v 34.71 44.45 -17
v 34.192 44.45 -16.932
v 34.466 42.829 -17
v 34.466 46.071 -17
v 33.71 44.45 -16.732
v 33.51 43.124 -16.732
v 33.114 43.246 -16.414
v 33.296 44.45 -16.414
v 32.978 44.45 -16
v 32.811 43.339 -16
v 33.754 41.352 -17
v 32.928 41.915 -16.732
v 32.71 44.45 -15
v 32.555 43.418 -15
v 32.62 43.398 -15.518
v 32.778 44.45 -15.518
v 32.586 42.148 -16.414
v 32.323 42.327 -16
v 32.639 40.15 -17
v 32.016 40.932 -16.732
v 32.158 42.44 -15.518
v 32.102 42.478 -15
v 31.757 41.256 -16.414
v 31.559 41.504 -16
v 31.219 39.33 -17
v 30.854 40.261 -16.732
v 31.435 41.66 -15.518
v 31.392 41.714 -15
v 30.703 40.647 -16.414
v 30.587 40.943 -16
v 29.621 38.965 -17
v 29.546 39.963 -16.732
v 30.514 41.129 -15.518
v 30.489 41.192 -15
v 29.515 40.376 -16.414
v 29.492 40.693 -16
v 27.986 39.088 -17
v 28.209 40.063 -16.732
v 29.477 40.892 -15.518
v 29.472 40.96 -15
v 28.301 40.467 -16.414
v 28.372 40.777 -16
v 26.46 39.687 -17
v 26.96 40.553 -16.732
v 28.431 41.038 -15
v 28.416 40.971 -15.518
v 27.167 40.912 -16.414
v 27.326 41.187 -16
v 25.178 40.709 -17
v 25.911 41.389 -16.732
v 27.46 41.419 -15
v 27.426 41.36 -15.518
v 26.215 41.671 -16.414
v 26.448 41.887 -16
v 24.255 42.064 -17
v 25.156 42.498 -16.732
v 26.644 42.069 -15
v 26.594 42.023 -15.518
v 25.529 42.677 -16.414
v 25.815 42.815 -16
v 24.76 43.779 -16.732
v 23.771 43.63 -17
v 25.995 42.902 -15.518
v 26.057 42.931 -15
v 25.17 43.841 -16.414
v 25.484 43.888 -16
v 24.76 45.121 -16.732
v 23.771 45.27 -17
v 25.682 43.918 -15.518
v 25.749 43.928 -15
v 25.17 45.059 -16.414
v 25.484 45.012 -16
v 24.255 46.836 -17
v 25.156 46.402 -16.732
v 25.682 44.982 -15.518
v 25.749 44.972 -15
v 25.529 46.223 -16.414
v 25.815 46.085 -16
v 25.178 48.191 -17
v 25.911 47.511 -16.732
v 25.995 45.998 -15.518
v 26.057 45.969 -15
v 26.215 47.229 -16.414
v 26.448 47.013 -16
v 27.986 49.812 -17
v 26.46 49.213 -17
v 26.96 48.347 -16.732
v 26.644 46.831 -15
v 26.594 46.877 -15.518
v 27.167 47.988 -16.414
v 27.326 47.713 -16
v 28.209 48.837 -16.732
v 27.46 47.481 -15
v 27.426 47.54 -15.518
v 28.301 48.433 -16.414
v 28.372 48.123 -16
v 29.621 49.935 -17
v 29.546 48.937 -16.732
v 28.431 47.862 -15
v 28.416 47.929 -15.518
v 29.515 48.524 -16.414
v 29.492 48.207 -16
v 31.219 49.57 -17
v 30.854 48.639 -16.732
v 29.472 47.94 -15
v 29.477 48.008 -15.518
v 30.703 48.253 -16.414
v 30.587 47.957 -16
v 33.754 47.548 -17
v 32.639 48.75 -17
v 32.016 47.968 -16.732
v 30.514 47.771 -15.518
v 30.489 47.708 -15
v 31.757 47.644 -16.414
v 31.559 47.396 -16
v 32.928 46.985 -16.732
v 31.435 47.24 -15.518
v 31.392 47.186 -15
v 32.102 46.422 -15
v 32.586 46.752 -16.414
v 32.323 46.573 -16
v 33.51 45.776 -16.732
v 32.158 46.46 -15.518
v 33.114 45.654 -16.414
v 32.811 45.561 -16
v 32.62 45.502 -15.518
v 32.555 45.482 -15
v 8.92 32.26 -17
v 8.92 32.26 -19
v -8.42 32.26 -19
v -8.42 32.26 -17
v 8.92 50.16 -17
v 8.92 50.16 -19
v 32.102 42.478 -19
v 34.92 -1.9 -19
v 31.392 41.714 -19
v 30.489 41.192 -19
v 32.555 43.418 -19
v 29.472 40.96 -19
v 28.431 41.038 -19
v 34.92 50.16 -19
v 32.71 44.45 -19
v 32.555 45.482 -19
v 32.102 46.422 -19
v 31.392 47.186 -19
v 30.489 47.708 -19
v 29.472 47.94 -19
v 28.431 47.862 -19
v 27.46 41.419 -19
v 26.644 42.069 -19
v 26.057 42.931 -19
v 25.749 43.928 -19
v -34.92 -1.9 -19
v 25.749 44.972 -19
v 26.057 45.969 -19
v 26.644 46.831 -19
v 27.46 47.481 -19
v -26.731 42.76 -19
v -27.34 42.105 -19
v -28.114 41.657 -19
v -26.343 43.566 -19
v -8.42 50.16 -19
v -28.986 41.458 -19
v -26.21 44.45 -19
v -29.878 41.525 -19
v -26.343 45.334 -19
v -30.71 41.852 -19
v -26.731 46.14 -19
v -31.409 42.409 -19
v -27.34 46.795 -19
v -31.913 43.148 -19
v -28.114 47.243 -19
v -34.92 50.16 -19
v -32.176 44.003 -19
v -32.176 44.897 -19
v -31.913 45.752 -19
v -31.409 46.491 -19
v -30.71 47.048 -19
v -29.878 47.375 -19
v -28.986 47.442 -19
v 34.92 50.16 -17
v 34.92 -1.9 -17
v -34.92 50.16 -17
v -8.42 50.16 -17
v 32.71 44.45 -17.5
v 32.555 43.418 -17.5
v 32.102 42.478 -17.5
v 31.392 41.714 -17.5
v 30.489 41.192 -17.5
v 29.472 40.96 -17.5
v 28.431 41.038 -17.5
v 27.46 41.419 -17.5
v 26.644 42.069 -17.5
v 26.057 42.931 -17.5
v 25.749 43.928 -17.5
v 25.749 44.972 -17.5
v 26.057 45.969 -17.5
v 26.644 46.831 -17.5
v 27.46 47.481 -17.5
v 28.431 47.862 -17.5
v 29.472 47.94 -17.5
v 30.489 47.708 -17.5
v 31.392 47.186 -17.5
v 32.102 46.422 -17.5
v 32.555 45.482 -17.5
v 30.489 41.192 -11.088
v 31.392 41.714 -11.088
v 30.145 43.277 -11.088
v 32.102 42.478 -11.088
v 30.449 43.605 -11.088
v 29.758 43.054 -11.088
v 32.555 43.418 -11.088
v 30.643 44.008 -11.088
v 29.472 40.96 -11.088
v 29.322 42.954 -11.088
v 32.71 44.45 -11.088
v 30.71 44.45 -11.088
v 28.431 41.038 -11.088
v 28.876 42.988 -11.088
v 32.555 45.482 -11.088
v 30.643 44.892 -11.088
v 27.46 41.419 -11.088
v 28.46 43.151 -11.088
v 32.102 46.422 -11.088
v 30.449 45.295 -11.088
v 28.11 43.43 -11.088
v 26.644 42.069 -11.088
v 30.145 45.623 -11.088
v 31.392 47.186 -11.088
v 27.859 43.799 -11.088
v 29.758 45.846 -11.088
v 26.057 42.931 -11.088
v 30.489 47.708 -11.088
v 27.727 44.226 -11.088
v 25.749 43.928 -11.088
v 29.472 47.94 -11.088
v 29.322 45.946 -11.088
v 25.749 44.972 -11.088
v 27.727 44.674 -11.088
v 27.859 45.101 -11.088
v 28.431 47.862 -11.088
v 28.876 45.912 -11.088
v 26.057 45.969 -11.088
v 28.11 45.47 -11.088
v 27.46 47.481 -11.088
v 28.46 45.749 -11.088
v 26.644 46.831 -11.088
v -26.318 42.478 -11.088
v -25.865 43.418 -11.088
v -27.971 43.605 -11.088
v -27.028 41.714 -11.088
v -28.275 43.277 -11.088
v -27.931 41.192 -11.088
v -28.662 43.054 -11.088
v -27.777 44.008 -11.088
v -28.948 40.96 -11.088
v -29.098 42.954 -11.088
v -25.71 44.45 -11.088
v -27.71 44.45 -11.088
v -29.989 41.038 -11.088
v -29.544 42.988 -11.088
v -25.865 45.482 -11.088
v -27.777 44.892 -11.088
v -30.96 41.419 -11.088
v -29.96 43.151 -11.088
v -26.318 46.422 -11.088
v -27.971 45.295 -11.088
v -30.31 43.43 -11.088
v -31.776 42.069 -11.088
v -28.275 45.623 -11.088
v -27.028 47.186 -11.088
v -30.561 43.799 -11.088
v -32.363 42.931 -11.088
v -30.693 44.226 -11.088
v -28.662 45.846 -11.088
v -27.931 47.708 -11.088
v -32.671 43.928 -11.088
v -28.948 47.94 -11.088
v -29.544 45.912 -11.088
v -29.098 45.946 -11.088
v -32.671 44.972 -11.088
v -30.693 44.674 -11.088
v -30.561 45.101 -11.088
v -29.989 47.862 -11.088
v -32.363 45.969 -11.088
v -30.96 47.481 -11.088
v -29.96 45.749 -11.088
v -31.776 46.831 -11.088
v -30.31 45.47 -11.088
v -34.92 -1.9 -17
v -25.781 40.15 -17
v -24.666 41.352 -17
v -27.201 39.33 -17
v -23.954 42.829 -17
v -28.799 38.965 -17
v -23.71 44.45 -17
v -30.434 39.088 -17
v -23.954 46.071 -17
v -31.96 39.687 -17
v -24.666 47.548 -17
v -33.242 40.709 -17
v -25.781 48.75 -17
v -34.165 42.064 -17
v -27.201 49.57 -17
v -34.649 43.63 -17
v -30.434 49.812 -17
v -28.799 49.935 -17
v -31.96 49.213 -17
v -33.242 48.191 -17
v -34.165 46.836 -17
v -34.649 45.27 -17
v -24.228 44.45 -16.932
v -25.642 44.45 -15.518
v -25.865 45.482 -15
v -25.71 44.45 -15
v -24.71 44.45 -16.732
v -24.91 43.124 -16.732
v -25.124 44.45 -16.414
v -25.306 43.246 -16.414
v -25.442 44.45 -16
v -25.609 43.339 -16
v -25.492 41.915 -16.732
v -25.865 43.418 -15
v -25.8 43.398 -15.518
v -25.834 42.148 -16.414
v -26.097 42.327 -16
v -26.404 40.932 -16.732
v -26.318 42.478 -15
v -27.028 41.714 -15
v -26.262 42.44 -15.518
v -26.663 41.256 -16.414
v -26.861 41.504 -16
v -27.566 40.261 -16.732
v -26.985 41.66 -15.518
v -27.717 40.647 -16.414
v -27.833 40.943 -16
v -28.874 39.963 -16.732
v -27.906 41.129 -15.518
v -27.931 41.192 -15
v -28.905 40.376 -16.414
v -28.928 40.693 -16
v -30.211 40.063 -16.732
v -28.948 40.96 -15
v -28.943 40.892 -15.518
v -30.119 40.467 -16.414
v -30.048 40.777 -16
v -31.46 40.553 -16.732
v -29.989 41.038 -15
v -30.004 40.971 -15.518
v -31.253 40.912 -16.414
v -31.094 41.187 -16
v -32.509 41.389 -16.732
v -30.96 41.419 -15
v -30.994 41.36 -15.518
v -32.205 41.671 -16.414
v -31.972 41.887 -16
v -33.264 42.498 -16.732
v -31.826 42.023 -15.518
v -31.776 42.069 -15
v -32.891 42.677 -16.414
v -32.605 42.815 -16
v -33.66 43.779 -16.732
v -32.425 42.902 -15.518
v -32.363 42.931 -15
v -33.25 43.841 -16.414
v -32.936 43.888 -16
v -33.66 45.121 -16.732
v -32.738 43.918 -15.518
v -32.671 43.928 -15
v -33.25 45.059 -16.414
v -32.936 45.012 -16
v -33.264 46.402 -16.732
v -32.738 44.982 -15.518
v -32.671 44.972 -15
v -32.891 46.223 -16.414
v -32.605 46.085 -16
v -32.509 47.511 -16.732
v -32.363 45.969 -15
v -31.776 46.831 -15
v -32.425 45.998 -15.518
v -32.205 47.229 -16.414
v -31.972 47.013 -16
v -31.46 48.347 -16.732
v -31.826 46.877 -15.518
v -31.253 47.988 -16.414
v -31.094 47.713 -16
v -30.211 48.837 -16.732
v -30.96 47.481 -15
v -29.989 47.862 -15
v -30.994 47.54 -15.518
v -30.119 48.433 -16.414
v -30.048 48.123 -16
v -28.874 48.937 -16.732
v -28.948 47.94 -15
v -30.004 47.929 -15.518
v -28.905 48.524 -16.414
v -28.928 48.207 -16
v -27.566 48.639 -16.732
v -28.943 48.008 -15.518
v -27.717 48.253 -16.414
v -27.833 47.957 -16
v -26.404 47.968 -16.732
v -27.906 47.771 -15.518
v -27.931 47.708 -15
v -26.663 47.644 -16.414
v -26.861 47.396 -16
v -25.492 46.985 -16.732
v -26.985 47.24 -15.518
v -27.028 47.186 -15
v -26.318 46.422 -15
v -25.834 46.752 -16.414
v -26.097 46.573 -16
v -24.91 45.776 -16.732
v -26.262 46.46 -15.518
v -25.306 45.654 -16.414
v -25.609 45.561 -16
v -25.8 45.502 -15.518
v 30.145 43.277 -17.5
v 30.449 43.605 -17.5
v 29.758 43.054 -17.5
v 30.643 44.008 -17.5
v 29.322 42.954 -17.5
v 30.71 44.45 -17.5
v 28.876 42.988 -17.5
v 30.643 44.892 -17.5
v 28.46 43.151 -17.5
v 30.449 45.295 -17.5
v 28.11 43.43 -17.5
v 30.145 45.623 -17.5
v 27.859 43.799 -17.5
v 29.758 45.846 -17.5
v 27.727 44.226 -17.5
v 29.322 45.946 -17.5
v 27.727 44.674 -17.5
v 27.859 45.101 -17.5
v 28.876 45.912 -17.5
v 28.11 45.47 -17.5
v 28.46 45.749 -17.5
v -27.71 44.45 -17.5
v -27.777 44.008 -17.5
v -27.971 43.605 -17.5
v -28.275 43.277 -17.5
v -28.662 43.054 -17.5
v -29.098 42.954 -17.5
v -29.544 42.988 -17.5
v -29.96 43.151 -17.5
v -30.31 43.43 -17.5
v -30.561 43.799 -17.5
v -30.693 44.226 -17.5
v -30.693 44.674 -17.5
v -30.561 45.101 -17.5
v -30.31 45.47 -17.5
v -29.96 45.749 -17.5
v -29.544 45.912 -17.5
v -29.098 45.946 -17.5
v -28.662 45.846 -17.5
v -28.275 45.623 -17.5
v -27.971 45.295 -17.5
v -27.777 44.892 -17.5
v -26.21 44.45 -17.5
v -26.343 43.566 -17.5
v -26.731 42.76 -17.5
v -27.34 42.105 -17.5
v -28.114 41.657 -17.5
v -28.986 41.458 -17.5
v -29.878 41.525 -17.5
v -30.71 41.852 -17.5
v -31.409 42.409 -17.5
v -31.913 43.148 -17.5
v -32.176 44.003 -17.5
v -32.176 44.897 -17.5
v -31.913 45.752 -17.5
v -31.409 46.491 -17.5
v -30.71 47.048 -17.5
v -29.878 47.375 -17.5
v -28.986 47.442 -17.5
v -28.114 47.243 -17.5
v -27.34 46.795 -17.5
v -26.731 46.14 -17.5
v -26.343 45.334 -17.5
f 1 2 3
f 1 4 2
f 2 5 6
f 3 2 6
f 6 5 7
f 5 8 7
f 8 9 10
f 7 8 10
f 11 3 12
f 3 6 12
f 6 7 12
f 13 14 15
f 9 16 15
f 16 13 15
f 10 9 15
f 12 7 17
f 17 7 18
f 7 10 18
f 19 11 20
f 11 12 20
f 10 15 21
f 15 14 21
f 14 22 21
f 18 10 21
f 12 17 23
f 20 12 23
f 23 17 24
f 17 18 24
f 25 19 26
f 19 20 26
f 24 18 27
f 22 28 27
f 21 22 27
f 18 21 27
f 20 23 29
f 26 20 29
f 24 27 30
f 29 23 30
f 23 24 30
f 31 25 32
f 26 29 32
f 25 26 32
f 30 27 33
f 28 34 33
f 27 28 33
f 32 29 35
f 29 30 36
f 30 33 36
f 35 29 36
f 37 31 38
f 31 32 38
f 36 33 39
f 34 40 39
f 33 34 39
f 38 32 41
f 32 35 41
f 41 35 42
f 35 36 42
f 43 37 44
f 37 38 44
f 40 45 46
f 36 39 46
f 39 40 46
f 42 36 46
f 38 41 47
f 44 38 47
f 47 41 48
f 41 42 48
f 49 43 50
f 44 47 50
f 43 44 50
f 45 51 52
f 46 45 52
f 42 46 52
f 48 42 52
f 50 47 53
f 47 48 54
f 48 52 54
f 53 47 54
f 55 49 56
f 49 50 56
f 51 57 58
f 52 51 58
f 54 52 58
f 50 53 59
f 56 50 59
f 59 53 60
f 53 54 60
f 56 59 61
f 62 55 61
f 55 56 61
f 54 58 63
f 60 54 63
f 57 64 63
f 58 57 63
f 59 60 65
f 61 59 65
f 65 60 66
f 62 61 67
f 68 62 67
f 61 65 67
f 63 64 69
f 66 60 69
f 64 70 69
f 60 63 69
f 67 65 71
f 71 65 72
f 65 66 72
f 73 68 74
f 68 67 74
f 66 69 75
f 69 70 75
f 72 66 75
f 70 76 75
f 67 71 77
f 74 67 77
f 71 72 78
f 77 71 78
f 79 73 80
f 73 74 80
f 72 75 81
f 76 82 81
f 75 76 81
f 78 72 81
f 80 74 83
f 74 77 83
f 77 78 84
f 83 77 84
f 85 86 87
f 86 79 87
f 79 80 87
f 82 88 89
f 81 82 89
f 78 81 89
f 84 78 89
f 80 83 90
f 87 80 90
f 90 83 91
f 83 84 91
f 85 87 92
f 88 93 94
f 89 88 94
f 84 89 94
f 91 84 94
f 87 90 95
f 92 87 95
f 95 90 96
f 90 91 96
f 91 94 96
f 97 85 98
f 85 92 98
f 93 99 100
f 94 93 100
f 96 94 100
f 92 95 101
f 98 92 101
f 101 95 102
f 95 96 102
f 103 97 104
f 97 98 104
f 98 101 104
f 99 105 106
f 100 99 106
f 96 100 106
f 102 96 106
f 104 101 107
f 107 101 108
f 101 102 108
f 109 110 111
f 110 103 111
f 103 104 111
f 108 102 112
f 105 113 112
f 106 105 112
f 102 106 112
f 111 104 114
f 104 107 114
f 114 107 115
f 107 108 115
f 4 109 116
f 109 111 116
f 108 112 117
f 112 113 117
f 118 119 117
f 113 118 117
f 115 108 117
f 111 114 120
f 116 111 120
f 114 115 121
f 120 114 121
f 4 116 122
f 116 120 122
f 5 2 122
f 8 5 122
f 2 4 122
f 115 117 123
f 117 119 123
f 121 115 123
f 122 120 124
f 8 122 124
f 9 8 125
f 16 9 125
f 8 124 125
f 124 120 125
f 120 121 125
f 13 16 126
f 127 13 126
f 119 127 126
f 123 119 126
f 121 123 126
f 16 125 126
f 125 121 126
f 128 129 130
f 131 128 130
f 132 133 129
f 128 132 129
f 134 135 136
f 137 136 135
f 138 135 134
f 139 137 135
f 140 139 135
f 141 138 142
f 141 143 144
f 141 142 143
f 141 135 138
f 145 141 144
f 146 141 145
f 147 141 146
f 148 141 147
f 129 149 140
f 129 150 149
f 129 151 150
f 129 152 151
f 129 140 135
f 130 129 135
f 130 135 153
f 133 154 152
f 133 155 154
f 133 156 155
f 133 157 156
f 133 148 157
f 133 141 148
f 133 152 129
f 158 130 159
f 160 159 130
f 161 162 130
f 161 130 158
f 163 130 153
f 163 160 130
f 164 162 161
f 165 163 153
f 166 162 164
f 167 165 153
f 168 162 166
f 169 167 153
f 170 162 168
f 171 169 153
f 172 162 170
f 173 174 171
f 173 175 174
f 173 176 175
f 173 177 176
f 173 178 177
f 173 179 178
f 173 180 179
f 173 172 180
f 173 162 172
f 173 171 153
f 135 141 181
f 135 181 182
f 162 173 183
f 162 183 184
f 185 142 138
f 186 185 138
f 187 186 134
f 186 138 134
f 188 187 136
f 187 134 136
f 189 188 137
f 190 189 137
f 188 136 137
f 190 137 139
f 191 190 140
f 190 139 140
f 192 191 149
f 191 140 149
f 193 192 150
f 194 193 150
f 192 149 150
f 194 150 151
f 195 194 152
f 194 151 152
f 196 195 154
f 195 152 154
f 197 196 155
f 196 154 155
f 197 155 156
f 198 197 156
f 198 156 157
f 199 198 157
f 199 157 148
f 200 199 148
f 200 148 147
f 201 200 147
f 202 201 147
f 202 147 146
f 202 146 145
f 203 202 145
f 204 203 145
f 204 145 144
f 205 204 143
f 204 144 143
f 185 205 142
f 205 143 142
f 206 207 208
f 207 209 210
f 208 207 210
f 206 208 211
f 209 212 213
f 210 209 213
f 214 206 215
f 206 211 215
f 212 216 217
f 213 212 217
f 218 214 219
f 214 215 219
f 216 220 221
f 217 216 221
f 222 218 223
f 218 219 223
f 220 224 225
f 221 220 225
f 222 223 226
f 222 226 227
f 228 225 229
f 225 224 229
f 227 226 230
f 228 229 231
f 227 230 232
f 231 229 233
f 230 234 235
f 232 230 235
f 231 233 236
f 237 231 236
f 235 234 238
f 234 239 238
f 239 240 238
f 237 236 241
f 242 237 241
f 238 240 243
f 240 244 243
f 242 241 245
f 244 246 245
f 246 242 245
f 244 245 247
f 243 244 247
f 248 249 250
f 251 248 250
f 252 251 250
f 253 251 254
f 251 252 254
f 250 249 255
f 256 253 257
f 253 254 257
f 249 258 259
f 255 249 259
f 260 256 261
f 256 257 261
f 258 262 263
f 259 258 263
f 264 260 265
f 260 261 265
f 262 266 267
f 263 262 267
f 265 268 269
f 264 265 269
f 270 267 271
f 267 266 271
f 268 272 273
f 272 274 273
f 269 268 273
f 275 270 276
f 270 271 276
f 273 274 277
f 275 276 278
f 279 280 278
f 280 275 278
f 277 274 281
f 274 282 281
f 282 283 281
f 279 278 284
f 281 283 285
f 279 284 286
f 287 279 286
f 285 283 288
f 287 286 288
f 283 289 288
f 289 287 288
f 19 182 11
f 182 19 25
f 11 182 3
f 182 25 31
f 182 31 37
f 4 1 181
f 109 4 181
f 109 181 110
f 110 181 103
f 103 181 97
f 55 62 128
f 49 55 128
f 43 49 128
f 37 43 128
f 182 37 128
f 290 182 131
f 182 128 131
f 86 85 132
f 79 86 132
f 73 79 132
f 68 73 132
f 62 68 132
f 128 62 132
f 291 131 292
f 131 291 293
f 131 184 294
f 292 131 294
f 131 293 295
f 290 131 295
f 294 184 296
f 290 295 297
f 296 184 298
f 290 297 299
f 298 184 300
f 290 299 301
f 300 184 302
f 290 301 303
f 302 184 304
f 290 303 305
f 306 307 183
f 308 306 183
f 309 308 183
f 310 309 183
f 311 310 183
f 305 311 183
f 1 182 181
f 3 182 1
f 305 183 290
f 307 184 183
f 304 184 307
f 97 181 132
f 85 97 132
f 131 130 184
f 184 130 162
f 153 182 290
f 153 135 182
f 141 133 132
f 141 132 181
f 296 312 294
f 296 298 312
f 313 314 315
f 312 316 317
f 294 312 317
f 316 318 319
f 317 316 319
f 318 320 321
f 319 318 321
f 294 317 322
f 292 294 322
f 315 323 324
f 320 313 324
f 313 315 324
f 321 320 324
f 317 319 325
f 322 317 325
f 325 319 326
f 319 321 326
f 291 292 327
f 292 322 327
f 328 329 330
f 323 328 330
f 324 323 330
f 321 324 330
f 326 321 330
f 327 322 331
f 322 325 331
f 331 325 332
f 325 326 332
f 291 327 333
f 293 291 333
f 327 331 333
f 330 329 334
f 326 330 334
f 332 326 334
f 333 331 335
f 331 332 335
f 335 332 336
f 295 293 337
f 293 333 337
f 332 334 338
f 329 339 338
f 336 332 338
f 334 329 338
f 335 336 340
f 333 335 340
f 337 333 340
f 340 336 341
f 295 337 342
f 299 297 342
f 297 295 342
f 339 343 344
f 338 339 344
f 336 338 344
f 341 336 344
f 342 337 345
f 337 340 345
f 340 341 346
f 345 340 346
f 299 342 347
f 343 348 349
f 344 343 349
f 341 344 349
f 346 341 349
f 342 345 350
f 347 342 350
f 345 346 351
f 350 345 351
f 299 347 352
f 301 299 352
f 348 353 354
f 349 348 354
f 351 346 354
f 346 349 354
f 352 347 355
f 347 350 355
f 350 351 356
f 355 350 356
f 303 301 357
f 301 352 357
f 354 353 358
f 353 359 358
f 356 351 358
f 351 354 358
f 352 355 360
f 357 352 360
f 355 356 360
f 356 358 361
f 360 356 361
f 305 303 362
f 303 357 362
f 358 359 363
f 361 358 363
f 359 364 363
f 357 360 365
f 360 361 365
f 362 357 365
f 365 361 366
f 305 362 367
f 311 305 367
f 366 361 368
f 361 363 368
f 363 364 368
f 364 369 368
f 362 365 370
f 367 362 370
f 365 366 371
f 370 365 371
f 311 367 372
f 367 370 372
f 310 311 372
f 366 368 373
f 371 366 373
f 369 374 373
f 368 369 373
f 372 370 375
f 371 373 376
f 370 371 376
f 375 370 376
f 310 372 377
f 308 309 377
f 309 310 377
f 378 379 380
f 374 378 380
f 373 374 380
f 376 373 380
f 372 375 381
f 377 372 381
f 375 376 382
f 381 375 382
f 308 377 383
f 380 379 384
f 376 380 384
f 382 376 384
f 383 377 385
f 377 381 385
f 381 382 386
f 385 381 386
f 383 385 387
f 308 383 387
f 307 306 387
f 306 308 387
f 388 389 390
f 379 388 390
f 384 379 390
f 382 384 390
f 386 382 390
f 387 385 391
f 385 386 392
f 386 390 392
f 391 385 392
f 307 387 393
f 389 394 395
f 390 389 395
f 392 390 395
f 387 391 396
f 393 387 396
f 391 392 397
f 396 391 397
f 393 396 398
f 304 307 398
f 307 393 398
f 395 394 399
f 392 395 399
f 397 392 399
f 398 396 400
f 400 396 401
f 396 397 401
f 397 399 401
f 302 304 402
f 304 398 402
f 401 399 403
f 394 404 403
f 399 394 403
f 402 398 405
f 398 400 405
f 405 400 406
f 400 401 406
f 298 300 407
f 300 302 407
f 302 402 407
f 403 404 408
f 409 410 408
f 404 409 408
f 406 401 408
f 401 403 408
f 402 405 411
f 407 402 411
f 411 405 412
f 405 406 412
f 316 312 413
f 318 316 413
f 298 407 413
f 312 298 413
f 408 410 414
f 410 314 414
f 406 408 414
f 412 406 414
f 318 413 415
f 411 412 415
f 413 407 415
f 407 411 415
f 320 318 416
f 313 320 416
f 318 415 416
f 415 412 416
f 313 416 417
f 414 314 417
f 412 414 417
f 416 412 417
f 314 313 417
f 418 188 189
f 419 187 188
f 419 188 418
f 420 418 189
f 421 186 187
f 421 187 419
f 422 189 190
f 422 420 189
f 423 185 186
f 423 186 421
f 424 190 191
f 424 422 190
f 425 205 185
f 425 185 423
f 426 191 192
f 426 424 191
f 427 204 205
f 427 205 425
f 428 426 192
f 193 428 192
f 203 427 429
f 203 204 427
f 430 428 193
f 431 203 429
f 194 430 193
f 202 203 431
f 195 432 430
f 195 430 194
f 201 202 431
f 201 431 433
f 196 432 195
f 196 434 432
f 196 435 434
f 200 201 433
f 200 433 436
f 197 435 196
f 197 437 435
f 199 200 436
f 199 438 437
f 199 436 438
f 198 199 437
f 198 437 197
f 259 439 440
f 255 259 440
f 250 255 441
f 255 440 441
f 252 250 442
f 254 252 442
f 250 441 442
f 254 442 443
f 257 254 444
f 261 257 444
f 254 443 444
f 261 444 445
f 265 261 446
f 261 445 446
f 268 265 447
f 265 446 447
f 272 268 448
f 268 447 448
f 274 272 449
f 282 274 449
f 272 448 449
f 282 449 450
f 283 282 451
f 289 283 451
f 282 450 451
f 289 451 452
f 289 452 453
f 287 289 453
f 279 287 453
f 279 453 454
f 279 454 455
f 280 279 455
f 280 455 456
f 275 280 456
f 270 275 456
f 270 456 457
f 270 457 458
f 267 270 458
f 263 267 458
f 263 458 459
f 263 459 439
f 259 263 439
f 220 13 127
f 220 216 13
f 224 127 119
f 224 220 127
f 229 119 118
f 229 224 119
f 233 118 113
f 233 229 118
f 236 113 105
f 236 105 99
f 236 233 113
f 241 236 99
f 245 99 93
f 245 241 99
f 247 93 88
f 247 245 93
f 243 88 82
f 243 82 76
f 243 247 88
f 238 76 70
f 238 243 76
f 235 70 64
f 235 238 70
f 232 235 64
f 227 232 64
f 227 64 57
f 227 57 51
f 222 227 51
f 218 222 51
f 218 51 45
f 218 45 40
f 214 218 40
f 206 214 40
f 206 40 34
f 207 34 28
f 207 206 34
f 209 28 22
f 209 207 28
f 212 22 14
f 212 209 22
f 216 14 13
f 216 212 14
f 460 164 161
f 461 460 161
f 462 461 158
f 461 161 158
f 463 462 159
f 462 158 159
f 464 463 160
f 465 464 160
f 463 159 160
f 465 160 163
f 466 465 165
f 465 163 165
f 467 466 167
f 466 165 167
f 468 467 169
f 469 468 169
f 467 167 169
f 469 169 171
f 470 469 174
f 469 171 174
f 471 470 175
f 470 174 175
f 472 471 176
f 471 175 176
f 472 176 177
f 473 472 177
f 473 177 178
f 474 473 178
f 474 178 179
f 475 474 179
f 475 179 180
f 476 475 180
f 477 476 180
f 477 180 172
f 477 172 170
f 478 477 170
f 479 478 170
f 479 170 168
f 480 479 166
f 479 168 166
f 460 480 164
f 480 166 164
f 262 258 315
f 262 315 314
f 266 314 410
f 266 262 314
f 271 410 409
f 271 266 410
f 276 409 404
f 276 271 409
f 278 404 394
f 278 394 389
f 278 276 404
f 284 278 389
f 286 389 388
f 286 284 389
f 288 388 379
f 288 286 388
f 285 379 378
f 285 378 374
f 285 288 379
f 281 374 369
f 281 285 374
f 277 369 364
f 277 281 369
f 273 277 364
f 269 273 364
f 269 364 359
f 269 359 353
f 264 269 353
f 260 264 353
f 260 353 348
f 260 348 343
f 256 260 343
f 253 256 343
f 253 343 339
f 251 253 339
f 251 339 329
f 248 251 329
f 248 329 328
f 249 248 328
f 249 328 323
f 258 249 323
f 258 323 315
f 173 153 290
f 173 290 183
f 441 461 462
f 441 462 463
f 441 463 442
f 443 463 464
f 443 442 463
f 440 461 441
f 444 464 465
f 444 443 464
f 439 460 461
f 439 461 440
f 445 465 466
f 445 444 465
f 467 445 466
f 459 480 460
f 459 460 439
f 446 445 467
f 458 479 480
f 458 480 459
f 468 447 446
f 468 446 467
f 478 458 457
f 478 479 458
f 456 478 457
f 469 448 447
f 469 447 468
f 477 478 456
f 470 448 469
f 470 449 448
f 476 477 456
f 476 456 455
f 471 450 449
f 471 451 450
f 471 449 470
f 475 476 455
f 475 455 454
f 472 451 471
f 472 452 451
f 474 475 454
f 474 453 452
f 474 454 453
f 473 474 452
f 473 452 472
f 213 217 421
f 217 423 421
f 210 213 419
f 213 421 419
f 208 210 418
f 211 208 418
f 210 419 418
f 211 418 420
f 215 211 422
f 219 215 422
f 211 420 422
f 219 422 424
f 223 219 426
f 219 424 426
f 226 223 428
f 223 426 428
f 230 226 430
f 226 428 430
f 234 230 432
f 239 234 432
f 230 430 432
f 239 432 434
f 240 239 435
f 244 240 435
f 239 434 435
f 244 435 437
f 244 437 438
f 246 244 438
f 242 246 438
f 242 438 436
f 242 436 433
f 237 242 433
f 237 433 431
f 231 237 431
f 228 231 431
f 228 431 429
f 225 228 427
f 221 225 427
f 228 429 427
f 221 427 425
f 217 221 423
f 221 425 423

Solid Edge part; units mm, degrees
sketch "Sketch1" plane through (0, 24.13, -19) normal (0, 0, -1) x (1, 0, 0)
  line L0 (-34.92, -26.03) -> (34.92, -26.03)
  line L1 (34.92, -26.03) -> (34.92, 26.03)
  line L2 (34.92, 26.03) -> (-34.92, 26.03)
  line L3 (-34.92, 26.03) -> (-34.92, -26.03)
  dimension "D1" = 0.1
  dimension "D2" = 0.1
  dimension "D3" = 0.1
  dimension "D4" = 0.1
extrude "Protrusion1" add sketch "Sketch1" against normal blind 2
sketch "Sketch2" plane through (-29.21, 44.45, -11.0875) normal (0, 0, -1) x (1, 0, 0)
  circle A0 centre (0, 0) radius 3.5
  circle A1 centre (58.42, 0) radius 3.5
extrude "ExtrudedProtrusion_2" add sketch "Sketch2" along normal up to next
sketch "Sketch3" plane through (0, 24.13, -19) normal (0, 0, -1) x (1, 0, 0)
  circle A0 centre (-29.21, -20.32) radius 1.5
  circle A1 centre (29.21, -20.32) radius 1.5
  dimension "D1" = 3
extrude "Cutout1" cut sketch "Sketch3" against normal up to next
sketch "Sketch4" plane through (0, 24.13, -19) normal (0, 0, -1) x (1, 0, 0)
  circle A0 centre (-29.21, -20.32) radius 3
  circle A1 centre (29.21, -20.32) radius 3.5
  dimension "D1" = 6
extrude "ExtrudedCutout_2" cut sketch "Sketch4" against normal blind 1.5
sketch "Sketch5" plane through (0, 24.13, -19) normal (0, 0, -1) x (1, 0, 0)
  line L0 (-8.42, -26.867) -> (8.92, -26.867)
  line L1 (8.92, -26.867) -> (8.92, -8.13)
  line L2 (8.92, -8.13) -> (-8.42, -8.13)
  line L3 (-8.42, -8.13) -> (-8.42, -26.867)
  dimension "D1" = 26.5
  dimension "D2" = 26
  dimension "D3" = 18
  dimension "D4" = 18.737
extrude "Cutout2" cut sketch "Sketch5" against normal through all
fillet "Round_1" radius 2 2 edges at (32.71, 44.45, -17) (-25.71, 44.45, -17)
